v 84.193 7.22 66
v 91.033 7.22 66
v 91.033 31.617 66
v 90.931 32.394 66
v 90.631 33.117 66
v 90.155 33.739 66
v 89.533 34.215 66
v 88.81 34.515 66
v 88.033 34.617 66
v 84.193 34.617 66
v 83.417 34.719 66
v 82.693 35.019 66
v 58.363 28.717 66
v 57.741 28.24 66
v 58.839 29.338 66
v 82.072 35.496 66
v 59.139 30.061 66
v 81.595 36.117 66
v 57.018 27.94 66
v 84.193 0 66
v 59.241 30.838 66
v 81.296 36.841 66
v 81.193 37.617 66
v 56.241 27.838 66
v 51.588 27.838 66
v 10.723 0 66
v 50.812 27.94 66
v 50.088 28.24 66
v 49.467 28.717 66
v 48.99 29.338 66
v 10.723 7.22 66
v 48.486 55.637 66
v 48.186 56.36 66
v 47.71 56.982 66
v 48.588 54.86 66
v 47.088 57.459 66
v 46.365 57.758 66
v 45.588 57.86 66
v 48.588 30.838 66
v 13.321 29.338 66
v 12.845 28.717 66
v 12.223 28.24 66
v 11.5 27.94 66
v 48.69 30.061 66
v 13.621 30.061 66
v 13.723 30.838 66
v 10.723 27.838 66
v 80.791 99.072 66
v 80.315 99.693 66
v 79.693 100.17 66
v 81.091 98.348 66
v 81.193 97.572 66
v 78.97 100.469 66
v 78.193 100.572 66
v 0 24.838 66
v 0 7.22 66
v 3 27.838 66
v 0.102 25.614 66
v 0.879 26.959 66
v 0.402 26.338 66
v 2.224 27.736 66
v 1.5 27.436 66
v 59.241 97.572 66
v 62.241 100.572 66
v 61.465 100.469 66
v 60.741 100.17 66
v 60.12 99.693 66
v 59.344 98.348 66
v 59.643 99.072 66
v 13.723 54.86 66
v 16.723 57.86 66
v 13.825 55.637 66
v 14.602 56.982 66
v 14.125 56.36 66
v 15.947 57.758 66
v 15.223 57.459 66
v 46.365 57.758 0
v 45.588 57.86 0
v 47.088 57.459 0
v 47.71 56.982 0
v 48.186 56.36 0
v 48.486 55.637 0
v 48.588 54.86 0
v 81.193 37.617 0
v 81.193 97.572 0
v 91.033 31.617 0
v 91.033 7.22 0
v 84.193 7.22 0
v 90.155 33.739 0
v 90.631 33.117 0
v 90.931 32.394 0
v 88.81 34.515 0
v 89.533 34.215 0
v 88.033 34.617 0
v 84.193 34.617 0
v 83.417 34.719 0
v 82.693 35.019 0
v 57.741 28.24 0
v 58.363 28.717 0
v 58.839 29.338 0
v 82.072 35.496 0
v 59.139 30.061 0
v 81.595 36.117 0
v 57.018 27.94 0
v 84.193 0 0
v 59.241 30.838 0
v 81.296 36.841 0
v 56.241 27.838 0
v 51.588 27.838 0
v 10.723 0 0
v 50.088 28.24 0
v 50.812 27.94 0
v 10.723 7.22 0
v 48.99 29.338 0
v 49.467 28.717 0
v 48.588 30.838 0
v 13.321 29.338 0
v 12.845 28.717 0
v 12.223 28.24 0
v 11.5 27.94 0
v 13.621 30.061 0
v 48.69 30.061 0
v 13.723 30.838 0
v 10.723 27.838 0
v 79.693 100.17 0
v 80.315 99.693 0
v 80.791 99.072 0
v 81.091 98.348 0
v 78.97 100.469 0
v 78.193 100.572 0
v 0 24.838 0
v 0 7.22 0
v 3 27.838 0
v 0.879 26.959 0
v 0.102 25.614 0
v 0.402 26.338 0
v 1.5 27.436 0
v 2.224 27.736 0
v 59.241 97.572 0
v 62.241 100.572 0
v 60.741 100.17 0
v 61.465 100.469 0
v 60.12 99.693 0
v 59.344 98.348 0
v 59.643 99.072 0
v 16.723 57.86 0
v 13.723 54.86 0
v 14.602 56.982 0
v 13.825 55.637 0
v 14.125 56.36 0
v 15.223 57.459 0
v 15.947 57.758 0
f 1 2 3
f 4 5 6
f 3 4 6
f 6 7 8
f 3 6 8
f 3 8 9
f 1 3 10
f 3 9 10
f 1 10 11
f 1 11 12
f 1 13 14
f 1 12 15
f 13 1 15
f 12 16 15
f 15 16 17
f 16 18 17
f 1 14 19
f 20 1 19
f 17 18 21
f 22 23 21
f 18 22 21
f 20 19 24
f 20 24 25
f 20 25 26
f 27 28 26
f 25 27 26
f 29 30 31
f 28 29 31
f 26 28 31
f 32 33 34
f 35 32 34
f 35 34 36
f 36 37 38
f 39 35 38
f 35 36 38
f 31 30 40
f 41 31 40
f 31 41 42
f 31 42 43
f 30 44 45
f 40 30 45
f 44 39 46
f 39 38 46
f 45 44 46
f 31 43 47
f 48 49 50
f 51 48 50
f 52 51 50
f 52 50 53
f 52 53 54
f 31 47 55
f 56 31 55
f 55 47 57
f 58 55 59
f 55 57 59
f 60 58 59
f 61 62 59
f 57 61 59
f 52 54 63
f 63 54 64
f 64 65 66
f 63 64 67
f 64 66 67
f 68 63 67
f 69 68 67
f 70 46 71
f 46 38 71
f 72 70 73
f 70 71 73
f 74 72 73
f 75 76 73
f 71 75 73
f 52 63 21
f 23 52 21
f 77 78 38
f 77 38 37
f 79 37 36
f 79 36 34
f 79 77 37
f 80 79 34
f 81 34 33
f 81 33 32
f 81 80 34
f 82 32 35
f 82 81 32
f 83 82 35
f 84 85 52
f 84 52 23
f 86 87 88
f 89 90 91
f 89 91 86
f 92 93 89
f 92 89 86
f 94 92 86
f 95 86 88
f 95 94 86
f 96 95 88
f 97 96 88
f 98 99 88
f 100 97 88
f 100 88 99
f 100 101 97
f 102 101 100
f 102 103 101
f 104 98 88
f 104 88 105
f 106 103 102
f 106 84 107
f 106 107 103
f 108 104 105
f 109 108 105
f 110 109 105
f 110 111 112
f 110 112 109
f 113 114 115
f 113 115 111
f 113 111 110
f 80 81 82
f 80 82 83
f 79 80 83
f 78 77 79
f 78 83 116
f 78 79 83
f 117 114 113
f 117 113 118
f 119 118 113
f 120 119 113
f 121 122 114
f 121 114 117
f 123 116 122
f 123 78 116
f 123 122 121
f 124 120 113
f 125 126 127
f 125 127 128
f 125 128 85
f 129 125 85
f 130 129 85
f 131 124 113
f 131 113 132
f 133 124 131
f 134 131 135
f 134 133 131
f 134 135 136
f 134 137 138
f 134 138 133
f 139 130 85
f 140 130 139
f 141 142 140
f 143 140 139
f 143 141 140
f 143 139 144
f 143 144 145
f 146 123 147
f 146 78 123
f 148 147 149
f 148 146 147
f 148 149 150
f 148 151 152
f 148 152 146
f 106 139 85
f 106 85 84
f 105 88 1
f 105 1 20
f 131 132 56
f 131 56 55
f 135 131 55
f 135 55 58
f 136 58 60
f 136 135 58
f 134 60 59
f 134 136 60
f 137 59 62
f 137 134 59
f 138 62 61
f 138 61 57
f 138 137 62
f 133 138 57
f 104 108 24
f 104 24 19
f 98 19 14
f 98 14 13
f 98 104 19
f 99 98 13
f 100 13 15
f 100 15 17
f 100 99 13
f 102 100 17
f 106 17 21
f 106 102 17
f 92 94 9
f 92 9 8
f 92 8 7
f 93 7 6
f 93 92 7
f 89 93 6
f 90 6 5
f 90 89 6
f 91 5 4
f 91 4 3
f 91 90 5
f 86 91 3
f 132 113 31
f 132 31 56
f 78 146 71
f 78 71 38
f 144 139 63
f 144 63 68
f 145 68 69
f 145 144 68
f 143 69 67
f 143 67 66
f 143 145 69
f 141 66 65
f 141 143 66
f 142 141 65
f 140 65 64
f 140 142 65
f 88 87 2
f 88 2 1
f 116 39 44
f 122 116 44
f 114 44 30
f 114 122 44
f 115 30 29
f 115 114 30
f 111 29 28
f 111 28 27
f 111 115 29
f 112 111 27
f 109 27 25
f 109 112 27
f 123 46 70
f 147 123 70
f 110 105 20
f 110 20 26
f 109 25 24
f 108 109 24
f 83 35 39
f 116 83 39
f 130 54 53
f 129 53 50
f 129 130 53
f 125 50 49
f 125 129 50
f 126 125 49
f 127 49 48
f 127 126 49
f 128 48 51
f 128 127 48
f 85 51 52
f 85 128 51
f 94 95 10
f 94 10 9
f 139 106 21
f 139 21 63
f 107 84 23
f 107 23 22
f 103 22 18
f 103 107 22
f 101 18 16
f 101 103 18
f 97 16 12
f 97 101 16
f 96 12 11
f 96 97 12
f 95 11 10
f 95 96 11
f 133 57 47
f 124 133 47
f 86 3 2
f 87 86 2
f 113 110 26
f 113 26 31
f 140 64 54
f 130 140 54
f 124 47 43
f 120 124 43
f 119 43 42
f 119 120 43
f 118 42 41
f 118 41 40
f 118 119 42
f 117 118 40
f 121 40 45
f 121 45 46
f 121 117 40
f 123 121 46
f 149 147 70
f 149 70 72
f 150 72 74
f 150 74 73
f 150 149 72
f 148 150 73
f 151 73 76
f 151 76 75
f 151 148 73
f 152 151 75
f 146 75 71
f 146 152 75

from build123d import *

# Parameters (mm, degrees)
Y_KSEKLIK_EKSTR_ZYON2_DEPTH = 66


with BuildPart() as part:
    # Çizim5 → Yükseklik-Ekstrüzyon2 (new body)
    with BuildSketch(Plane.XY):
        with BuildLine():
            Line((3, 27.837901934), (10.723277294, 27.837901934))
            ThreePointArc((10.723277294, 27.837901934), (12.844597638, 28.716581591), (13.723277294, 30.837901934))
            Line((13.723277294, 30.837901934), (13.723277294, 54.860494767))
            ThreePointArc((13.723277294, 54.860494767), (14.60195695, 56.98181511), (16.723277294, 57.860494767))
            Line((16.723277294, 57.860494767), (45.588223809, 57.860494767))
            ThreePointArc((45.588223809, 57.860494767), (47.709544152, 56.98181511), (48.588223809, 54.860494767))
            Line((48.588223809, 54.860494767), (48.588223809, 30.837901934))
            ThreePointArc((48.588223809, 30.837901934), (49.466903465, 28.716581591), (51.588223809, 27.837901934))
            Line((51.588223809, 27.837901934), (56.24140191, 27.837901934))
            ThreePointArc((56.24140191, 27.837901934), (58.362722254, 28.716581591), (59.24140191, 30.837901934))
            Line((59.24140191, 30.837901934), (59.24140191, 97.571673858))
            ThreePointArc((59.24140191, 97.571673858), (60.120081567, 99.692994202), (62.24140191, 100.571673858))
            Line((62.24140191, 100.571673858), (78.193405271, 100.571673858))
            ThreePointArc((78.193405271, 100.571673858), (80.314725615, 99.692994202), (81.193405271, 97.571673858))
            Line((81.193405271, 97.571673858), (81.193405271, 37.61719709))
            ThreePointArc((81.193405271, 37.61719709), (82.072084928, 35.495876747), (84.193405271, 34.61719709))
            Line((84.193405271, 34.61719709), (88.033262194, 34.61719709))
            ThreePointArc((88.033262194, 34.61719709), (90.154582538, 33.738517434), (91.033262194, 31.61719709))
            Line((91.033262194, 31.61719709), (91.033262194, 7.220315017))
            Line((91.033262194, 7.220315017), (84.193405271, 7.220315017))
            Line((84.193405271, 7.220315017), (84.193405271, 0))
            Line((84.193405271, 0), (10.723277294, 0))
            Line((10.723277294, 0), (10.723277294, 7.220315017))
            Line((10.723277294, 7.220315017), (0, 7.220315017))
            Line((0, 7.220315017), (0, 24.837901934))
            ThreePointArc((0, 24.837901934), (0.878679656, 26.959222278), (3, 27.837901934))
        make_face()
    extrude(amount=Y_KSEKLIK_EKSTR_ZYON2_DEPTH)


solid = part.part
